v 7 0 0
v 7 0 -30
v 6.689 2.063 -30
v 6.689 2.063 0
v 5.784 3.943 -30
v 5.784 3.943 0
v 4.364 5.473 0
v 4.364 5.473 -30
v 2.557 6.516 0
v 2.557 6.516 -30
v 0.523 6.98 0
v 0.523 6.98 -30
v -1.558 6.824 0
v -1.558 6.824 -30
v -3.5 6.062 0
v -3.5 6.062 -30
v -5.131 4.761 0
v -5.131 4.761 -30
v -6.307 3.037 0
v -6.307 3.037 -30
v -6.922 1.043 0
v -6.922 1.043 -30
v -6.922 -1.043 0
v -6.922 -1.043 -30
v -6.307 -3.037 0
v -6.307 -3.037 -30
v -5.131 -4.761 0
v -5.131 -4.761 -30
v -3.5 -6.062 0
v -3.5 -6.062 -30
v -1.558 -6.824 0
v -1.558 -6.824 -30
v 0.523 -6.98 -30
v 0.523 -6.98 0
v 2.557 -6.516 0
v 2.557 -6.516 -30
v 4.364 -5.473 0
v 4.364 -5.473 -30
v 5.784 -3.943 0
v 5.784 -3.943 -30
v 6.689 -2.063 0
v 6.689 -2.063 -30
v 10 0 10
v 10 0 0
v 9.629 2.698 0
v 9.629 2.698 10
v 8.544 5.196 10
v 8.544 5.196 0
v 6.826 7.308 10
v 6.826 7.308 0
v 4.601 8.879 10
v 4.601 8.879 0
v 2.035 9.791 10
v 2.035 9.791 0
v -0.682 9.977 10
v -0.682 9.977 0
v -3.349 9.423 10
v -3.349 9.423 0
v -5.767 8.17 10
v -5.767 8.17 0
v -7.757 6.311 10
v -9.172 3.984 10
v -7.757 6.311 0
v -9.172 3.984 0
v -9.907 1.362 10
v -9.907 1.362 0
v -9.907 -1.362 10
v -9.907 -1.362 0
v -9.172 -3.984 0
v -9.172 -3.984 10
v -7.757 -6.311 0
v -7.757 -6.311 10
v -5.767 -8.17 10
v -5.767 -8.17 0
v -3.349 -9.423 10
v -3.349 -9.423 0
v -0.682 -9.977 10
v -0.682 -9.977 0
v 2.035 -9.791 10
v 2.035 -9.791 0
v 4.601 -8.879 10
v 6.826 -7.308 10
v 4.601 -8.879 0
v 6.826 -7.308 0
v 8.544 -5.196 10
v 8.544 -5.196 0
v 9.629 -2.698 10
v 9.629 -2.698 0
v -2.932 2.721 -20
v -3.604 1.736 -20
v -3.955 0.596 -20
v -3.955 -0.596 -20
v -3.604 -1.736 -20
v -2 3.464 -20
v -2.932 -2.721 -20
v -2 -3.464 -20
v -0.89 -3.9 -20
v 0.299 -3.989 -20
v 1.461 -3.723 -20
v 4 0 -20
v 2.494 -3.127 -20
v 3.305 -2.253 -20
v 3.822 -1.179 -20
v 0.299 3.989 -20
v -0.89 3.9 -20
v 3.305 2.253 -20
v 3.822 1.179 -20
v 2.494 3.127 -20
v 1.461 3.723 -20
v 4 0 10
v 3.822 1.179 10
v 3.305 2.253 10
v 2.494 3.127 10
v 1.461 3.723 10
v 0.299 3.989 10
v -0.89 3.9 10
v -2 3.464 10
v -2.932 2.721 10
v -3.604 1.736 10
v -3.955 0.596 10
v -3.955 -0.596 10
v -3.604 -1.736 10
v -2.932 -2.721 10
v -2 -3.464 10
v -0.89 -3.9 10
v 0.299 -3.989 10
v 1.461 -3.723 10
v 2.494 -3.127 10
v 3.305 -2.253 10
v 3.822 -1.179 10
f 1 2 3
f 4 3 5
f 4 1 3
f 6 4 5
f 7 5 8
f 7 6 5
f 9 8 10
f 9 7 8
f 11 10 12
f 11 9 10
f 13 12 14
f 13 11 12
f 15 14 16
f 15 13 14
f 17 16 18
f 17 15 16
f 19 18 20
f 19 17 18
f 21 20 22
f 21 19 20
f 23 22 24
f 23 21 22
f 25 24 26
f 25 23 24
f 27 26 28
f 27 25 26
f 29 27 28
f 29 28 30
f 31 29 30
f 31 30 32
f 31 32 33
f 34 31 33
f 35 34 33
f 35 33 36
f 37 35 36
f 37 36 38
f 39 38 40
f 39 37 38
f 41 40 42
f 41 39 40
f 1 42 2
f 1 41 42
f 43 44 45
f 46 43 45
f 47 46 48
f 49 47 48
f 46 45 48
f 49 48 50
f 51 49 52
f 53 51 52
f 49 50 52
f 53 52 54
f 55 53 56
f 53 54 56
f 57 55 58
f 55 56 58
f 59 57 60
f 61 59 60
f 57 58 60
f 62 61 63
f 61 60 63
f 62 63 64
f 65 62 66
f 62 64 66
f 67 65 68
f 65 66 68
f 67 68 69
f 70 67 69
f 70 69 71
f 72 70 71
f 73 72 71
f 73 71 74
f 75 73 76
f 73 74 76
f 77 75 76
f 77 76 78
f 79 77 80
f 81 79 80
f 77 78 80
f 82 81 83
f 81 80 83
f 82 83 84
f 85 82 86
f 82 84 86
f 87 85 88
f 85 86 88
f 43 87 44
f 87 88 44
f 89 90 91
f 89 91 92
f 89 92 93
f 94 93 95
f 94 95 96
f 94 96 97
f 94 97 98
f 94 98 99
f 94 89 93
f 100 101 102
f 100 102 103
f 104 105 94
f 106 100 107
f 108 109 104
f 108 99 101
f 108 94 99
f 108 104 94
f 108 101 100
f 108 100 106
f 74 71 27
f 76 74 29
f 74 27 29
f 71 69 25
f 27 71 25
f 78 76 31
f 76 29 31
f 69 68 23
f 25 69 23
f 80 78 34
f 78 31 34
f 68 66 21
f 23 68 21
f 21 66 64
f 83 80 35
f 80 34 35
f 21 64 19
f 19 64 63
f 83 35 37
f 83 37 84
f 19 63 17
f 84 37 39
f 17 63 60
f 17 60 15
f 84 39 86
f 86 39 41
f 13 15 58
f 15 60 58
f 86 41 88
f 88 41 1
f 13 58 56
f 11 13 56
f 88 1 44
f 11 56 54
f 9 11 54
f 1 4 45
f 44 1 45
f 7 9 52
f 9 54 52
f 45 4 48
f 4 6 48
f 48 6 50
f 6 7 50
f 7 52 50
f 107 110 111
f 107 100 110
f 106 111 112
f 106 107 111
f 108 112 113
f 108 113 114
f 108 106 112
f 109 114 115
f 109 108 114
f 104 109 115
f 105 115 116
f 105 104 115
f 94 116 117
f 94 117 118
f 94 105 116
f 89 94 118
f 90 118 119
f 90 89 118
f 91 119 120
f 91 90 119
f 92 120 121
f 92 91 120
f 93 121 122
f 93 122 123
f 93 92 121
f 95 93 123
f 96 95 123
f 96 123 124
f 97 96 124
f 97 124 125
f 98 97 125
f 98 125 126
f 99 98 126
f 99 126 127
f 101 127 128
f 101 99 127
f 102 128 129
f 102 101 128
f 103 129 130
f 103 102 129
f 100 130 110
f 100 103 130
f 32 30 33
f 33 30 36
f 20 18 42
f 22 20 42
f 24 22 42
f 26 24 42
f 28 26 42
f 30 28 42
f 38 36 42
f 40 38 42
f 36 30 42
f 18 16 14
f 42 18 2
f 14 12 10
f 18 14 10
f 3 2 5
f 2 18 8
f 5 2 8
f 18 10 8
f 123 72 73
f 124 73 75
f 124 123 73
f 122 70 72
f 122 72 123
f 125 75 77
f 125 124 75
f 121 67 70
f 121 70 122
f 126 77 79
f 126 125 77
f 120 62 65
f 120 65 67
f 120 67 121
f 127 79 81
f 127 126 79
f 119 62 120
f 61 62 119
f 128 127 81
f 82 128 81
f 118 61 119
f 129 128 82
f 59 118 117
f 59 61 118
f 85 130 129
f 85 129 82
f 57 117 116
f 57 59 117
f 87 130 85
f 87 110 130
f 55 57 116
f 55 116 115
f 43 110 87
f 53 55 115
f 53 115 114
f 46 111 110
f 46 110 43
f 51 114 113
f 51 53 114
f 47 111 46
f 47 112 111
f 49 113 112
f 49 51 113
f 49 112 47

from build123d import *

# Parameters (mm, degrees)
F0_R     = 7
F0_R_2   = 4
F1_DEPTH = 30
F2_DEPTH = 20
F0_R_3   = 10
F3_DEPTH = 10


with BuildPart() as f1:
    # F0 (on Top) → F1 (new body)
    with BuildSketch(Plane.XY):
        Circle(F0_R)
        Circle(F0_R_2, mode=Mode.SUBTRACT)
        Circle(F0_R_2)
    extrude(amount=-F1_DEPTH)

    # F0 (on Top) → F2 (cut)
    with BuildSketch(Plane.XY):
        Circle(F0_R_2)
    extrude(amount=-F2_DEPTH, mode=Mode.SUBTRACT)

    # F0 (on Top) → F3 (join)
    with BuildSketch(Plane.XY):
        Circle(F0_R_3)
        Circle(F0_R, mode=Mode.SUBTRACT)
        Circle(F0_R)
        Circle(F0_R_2, mode=Mode.SUBTRACT)
    extrude(amount=F3_DEPTH)


solid = f1.part
